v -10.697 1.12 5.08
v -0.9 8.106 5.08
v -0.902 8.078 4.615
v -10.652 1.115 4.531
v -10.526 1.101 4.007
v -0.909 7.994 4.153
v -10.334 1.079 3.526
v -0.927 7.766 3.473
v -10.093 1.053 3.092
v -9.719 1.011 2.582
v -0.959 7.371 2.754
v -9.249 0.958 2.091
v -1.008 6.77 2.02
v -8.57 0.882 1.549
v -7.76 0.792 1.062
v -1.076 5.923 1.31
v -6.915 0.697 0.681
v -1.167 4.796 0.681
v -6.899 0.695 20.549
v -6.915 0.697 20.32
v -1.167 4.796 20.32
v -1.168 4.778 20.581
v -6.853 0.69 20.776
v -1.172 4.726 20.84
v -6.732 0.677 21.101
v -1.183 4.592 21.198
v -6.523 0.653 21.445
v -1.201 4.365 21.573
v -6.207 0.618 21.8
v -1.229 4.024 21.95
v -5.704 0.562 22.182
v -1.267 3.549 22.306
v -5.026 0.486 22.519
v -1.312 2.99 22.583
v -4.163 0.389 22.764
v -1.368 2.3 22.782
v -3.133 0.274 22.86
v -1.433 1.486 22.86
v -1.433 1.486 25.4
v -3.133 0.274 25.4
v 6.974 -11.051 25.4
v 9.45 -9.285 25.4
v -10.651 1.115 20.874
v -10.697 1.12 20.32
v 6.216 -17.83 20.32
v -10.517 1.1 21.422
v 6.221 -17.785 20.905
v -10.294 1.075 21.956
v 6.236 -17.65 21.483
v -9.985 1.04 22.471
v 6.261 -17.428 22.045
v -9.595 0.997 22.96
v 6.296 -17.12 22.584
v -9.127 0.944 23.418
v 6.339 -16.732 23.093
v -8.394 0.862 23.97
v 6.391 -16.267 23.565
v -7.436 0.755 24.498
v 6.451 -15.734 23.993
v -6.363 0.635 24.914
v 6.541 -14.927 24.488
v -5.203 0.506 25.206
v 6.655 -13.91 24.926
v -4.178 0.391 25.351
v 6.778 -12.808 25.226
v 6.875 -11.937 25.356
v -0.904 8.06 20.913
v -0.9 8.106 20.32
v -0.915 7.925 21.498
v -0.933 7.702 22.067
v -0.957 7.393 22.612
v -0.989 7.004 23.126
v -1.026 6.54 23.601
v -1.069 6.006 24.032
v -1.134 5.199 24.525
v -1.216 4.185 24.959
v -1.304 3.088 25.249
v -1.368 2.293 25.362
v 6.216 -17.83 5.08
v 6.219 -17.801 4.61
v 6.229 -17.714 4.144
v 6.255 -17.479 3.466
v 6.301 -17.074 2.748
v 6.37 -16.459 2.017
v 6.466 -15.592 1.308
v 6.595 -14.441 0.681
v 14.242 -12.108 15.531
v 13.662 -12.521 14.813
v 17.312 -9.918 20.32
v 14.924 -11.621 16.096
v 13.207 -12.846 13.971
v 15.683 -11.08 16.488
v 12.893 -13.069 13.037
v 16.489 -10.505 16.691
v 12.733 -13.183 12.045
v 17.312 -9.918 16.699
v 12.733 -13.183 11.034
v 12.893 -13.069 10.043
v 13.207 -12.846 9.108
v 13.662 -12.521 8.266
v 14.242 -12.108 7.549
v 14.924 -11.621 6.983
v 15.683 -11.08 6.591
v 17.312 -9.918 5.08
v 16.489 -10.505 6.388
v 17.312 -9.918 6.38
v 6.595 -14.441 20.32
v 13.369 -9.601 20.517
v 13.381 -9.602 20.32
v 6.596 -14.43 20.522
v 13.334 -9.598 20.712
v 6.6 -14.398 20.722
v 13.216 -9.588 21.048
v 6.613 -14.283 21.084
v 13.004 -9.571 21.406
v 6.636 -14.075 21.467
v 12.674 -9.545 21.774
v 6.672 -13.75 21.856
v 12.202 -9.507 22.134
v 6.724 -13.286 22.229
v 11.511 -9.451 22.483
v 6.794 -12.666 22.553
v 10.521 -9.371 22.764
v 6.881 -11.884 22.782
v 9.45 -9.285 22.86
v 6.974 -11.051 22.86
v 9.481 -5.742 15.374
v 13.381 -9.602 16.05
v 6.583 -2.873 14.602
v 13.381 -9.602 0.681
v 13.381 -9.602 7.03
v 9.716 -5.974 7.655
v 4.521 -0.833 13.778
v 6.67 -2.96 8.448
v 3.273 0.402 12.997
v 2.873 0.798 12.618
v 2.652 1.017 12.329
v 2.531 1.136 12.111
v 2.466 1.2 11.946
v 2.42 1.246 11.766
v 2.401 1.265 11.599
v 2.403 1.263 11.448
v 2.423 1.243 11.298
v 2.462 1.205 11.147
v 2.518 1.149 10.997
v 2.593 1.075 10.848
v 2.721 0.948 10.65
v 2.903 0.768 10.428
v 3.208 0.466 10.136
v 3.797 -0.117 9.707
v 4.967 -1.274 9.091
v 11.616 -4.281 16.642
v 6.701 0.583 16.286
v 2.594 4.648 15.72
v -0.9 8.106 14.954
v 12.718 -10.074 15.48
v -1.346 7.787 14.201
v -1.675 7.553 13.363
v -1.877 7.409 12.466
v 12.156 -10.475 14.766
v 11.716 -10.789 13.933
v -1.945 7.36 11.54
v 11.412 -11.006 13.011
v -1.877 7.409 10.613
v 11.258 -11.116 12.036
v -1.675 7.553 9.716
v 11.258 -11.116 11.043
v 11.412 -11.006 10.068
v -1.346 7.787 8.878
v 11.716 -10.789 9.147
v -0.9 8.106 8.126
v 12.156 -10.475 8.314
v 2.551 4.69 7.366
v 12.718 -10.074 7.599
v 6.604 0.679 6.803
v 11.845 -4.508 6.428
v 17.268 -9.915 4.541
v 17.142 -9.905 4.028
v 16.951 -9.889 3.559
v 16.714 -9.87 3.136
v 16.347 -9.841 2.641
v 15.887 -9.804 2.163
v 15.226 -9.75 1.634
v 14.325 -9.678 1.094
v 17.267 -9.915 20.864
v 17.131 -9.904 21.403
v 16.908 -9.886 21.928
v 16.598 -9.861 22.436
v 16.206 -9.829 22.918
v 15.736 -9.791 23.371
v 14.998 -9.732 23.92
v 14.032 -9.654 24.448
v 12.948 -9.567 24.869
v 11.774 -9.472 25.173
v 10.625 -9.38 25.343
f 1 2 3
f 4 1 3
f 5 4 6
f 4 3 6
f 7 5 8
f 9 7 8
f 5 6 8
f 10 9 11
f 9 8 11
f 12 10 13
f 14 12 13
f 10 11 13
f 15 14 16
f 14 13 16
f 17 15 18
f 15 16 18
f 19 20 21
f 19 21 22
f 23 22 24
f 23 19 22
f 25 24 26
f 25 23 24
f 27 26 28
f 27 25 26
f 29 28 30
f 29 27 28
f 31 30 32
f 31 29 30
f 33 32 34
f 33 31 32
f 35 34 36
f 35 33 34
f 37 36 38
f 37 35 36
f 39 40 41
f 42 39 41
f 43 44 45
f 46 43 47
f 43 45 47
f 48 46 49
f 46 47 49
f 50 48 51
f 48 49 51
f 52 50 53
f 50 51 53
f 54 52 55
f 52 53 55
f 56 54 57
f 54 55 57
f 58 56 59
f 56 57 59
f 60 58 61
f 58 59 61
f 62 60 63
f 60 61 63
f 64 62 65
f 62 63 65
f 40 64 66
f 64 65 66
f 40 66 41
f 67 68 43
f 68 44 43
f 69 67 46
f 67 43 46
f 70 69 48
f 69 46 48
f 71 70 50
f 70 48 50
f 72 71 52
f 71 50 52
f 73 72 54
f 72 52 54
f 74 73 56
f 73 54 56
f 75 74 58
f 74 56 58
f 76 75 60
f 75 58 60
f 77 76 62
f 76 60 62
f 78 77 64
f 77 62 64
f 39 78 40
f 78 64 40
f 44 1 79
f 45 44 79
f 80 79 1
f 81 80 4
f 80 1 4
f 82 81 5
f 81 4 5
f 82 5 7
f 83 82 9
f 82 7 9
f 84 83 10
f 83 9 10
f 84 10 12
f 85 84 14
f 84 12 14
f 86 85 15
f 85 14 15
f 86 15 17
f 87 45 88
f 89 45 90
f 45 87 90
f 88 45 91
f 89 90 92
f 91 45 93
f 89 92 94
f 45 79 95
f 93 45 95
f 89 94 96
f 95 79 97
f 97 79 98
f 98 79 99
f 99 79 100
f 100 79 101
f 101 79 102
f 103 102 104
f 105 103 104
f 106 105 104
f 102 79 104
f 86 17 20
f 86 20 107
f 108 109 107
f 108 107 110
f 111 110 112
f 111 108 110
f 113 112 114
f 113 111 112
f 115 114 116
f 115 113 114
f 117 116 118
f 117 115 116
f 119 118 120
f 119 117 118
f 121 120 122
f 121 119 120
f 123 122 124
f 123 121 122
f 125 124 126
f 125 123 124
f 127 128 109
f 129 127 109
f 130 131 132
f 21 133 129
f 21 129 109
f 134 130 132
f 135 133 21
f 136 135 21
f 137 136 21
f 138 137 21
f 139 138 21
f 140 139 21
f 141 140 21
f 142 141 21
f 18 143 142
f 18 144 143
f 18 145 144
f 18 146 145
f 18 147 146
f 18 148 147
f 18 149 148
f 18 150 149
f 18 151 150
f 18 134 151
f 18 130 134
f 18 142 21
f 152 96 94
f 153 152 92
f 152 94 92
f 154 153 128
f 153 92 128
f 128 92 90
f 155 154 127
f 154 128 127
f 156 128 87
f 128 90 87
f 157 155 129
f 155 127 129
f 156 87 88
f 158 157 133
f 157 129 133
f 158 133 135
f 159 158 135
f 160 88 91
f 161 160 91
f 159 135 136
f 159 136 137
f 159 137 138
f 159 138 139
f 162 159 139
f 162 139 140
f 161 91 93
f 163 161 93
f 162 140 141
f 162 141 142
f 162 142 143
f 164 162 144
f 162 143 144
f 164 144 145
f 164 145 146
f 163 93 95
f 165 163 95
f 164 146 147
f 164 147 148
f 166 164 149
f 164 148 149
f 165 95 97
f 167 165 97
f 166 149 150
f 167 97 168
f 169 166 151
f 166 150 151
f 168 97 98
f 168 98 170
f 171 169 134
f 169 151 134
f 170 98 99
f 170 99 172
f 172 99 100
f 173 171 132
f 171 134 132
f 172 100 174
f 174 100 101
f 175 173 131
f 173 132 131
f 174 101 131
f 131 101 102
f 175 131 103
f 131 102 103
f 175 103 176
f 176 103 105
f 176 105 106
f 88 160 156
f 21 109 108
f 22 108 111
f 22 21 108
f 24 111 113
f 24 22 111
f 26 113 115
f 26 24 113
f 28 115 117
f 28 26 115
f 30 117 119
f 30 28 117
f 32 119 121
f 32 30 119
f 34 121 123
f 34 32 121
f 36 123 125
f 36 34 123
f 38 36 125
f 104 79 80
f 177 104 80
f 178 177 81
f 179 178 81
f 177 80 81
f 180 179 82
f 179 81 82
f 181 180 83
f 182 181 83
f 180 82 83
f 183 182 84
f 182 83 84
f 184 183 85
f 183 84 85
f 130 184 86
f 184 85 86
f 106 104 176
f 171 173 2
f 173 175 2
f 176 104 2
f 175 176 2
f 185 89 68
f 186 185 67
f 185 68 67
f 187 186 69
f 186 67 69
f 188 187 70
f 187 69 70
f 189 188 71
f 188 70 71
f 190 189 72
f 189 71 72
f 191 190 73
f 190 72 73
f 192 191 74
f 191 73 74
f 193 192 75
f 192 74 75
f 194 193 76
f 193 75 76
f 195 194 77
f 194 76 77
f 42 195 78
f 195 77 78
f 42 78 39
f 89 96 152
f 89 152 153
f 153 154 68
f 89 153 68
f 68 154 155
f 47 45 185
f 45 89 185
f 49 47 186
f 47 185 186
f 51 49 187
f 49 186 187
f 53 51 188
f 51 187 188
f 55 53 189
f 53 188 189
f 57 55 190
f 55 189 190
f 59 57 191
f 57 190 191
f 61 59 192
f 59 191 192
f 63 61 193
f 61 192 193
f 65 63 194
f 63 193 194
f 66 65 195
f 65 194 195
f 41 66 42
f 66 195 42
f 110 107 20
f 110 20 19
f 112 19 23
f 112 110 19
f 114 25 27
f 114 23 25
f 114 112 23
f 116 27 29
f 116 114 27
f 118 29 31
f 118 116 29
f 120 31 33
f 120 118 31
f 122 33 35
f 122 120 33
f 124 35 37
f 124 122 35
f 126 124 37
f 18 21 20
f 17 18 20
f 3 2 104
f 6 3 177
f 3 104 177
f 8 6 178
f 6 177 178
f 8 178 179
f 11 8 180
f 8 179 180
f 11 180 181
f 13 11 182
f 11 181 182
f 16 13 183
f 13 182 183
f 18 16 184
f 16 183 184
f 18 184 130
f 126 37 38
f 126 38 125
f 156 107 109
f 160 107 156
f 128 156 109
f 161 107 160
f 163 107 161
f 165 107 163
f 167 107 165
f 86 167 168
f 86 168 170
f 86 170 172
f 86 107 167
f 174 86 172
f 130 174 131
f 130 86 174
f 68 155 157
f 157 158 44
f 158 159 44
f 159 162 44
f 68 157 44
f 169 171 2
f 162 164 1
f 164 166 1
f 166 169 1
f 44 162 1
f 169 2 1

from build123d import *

# Parameters (mm, degrees)
F1_DEPTH    = 25.4
F2_R        = 5.08
F3_T        = -2.54
F4_T1_DEPTH = 50.8
F4_T3_DEPTH = 39.0278032796
F4_T5_DEPTH = 51.0230548821
F4_T7_DEPTH = 37.4321438382
F6_DEPTH    = 105.664


# Not quite as in the source:
# - a fillet or chamfer that OpenCascade refuses, or shapes differently, is made with other operations: its cross-section is extruded or revolved along the edge and cut away or added


with BuildPart() as f1:
    # F0 (on Top) → F1 (new body)
    with BuildSketch(Plane.XY):
        Polygon((-0.8999820115, 8.1055370808), (-10.6966300514, 1.1199682045), (6.2161790492, -17.8304114309), (17.312023155, -9.9184416504), align=None)
    extrude(amount=F1_DEPTH)

    # F2
    f2_edges = [f1.edges().sort_by_distance(p)[0] for p in [
        (8.206021, -0.906452, 25.4),
        (11.764101, -13.874427, 25.4),
        (-2.240226, -8.355222, 25.4),
        (-5.798306, 4.612753, 25.4),
    ]]
    fillet(f2_edges, radius=F2_R)

    # F3
    f3_openings = [f1.faces().sort_by_distance(p)[0] for p in [
        (3.164917, -4.822441, 0),
    ]]
    offset(amount=F3_T, openings=f3_openings)

    # F4: fillet of radius 5.08 on 4 edges, made by hand

    # F4_s2 → F4_t1 (cut)
    with BuildSketch(Plane(origin=(-13.7553254463, 15.4124981643, 0), x_dir=(0, 0, 1), z_dir=(0.665858626, -0.7460779384, 0))):
        with BuildLine():
            ThreePointArc((5.08, 7.2347792067), (1.4878975516, 5.7468816552), (0, 2.1547792067))
            Line((0, 2.1547792067), (0, 7.2347792067))
            Line((0, 7.2347792067), (5.08, 7.2347792067))
        make_face()
    extrude(amount=F4_T1_DEPTH, mode=Mode.SUBTRACT)

    # F4_s4 → F4_t3 (cut)
    with BuildSketch(Plane(origin=(-14.6481007776, -10.4449314165, 0), x_dir=(0, 0, 1), z_dir=(0.8142063602, 0.5805755791, 0))):
        with BuildLine():
            ThreePointArc((5.08, 18.1265961431), (1.4878975516, 16.6386985916), (0, 13.0465961431))
            Line((0, 13.0465961431), (0, 18.1265961431))
            Line((0, 18.1265961431), (5.08, 18.1265961431))
        make_face()
    extrude(amount=F4_T3_DEPTH, mode=Mode.SUBTRACT)

    # F4_s6 → F4_t5 (cut)
    with BuildSketch(Plane(origin=(22.7315266592, -22.496839271, 0), x_dir=(0, 0, 1), z_dir=(-0.7107663489, 0.7034281749, 0))):
        with BuildLine():
            ThreePointArc((5.08, 5.1280702931), (1.4878975516, 3.6401727415), (0, 0.0480702931))
            Line((0, 0.0480702931), (0, 5.1280702931))
            Line((0, 5.1280702931), (5.08, 5.1280702931))
        make_face()
    extrude(amount=F4_T5_DEPTH, mode=Mode.SUBTRACT)

    # F4_s8 → F4_t7 (cut)
    with BuildSketch(Plane(origin=(13.575348792, 9.6799980584, 0), x_dir=(0, 0, 1), z_dir=(-0.8142063602, -0.5805755791, 0))):
        with BuildLine():
            ThreePointArc((5.08, 7.1220874215), (1.4878975516, 5.6341898699), (0, 2.0420874215))
            Line((0, 2.0420874215), (0, 7.1220874215))
            Line((0, 7.1220874215), (5.08, 7.1220874215))
        make_face()
    extrude(amount=F4_T7_DEPTH, mode=Mode.SUBTRACT)

    # F5 (on face) → F6 (cut)
    with BuildSketch(Plane(origin=(10.5238590523, -14.7587898685, 0), x_dir=(0.8142063602, 0.5805755791, 0), z_dir=(0.5805755791, -0.8142063602, 0))):
        with BuildLine():
            Line((8.3371543562, 6.3802872405), (8.3371543562, 16.698849146))
            ThreePointArc((8.3371543562, 16.698849146), (2.6890388134, 11.5395681933), (8.3371543562, 6.3802872405))
        make_face()
        with BuildLine():
            ThreePointArc((8.3371543562, 6.3802872405), (11.6943719949, 8.0457081644), (13.0499085036, 11.5395681933))
            ThreePointArc((13.0499085036, 11.5395681933), (11.6943719949, 15.0334282221), (8.3371543562, 16.698849146))
            Line((8.3371543562, 16.698849146), (8.3371543562, 6.3802872405))
        make_face()
    extrude(amount=-F6_DEPTH, mode=Mode.SUBTRACT)


solid = f1.part
